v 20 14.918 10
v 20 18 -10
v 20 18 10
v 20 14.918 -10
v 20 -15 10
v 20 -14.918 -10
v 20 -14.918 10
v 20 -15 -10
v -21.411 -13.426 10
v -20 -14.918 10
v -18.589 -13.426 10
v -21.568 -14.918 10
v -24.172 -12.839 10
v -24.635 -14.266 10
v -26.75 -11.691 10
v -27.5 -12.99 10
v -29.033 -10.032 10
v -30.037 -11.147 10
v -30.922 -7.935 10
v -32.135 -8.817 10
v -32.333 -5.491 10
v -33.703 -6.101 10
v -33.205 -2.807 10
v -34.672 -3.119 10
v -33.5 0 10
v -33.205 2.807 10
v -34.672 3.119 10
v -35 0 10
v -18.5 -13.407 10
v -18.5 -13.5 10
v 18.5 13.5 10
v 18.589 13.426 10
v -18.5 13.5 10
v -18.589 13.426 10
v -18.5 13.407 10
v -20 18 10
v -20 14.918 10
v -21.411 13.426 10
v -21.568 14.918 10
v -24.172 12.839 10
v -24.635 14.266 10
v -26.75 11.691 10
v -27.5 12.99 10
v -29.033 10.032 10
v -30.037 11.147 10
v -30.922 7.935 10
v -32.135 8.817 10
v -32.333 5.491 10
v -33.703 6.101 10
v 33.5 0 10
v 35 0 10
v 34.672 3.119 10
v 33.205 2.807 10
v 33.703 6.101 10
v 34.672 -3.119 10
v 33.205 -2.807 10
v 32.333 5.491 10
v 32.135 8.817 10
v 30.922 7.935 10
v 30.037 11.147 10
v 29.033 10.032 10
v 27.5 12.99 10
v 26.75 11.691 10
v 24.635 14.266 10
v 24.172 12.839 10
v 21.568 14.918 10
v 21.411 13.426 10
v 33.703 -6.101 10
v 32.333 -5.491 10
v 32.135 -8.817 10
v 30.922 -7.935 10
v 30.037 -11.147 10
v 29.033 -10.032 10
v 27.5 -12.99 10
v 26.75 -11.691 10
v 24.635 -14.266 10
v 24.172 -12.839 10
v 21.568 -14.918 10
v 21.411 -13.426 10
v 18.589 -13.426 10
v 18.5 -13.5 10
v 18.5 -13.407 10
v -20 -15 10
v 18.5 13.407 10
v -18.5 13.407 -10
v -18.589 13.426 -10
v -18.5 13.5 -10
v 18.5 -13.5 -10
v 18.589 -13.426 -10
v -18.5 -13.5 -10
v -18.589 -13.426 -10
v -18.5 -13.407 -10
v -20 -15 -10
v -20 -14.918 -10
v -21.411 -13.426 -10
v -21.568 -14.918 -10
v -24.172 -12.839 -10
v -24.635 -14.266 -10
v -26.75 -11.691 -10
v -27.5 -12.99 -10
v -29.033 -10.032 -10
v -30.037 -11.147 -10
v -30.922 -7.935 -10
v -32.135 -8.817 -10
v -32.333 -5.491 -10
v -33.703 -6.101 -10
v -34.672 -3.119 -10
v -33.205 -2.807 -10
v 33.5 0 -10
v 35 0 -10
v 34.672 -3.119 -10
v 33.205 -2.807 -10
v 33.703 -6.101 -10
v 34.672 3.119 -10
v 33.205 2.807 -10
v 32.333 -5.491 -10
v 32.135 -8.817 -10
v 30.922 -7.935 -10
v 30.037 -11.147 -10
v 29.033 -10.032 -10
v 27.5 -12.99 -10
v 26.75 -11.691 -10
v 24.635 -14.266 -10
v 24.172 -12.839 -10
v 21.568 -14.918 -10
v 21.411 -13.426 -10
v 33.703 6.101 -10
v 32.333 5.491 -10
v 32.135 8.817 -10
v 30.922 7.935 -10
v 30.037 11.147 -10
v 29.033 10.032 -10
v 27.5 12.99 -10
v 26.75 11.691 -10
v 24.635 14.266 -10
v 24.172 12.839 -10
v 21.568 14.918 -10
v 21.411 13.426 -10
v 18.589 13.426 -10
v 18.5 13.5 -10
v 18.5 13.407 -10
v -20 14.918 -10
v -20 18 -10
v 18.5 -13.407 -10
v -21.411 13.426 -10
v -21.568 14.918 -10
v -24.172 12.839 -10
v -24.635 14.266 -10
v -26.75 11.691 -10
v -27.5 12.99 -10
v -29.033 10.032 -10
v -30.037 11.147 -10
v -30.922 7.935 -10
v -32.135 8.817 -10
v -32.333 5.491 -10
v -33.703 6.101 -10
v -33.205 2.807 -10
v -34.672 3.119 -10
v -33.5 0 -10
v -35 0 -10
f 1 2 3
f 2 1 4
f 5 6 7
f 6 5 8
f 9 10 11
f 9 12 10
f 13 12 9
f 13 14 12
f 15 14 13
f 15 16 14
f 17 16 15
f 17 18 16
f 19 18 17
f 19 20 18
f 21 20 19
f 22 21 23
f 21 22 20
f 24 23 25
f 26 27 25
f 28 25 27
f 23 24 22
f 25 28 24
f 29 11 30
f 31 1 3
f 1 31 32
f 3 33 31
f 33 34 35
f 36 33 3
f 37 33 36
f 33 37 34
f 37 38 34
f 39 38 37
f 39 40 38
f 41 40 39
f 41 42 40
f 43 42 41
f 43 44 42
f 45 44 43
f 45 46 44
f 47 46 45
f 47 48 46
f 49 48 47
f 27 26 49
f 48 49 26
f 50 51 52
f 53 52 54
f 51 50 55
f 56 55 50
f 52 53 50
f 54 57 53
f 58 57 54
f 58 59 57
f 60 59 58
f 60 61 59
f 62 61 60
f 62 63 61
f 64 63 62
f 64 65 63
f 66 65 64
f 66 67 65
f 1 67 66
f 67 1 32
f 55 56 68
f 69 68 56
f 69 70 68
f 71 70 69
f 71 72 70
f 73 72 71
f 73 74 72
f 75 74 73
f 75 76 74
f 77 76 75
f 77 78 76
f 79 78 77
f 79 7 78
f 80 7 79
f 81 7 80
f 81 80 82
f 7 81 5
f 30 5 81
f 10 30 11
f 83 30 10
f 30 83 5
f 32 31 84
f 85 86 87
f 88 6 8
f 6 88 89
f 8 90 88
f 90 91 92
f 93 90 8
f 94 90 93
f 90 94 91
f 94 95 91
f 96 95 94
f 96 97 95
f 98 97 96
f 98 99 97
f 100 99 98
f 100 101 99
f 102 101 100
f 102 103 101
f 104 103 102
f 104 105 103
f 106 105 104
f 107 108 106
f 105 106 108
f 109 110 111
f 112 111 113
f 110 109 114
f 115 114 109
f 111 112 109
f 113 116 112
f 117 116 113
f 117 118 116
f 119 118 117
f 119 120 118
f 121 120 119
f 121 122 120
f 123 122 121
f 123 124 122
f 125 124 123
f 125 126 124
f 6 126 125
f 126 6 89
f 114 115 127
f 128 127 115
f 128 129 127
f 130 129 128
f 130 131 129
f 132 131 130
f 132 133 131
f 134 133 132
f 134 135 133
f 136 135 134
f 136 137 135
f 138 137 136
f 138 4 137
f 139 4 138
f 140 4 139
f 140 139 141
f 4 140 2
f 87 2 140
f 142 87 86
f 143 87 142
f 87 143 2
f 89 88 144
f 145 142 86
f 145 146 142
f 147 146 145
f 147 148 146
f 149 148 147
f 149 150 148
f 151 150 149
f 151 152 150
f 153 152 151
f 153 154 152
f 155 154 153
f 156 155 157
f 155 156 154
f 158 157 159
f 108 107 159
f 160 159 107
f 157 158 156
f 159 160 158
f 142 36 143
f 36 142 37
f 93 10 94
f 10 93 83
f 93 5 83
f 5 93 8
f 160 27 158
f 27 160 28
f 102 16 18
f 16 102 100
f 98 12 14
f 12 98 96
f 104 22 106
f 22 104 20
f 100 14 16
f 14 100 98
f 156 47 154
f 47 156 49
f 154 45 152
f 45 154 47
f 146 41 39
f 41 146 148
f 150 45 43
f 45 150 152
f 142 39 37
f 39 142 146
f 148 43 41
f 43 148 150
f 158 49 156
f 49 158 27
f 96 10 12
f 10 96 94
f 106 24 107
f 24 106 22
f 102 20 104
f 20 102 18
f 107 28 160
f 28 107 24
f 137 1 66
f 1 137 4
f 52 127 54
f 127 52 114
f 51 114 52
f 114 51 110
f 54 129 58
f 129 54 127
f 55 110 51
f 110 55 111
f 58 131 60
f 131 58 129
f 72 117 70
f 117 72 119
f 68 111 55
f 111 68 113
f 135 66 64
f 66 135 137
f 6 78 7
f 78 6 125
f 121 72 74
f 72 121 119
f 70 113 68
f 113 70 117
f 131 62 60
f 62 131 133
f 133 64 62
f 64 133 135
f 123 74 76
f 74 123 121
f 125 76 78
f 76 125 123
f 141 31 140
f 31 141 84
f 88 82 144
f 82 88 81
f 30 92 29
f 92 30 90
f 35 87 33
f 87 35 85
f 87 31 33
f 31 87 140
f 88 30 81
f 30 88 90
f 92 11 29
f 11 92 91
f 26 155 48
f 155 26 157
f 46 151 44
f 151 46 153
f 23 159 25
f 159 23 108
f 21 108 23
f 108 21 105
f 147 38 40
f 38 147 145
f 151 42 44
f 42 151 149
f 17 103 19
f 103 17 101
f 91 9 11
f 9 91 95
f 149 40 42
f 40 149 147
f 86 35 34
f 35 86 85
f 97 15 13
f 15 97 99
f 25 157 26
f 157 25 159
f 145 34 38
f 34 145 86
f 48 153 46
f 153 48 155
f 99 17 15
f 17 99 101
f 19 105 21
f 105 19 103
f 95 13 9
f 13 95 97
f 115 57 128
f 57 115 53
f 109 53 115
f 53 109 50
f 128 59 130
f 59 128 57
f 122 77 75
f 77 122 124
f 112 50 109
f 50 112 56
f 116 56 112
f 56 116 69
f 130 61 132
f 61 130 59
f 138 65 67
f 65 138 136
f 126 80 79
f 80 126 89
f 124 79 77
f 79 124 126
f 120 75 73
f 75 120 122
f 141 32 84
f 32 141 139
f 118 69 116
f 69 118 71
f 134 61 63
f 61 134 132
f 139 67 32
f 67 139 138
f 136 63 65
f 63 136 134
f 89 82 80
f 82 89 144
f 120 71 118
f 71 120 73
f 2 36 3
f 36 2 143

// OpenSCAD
width = 20;
length = 40;
height = 30;
thick = 3;
elect_thick = 3;

color("blue")
{
difference()
{
    outer();
    inner();

}
translate([0,height/2+thick/2,0])
    cube([length,elect_thick,width],center=true);
}
module outer()
{
    cube([length,height,width],center=true);
    translate([-length/2,0,0])
        cylinder(r=height/2,h=width,center=true);
    translate([length/2,0,0])
        cylinder(r=height/2,h=width,center=true);
}
module inner()
{
    cube([length-thick,height-thick,width+thick],center=true);
    translate([-length/2,0,0])
        cylinder(r=(height-thick)/2,h=width+thick,center=true);
    translate([length/2,0,0])
        cylinder(r=(height-thick)/2,h=width+thick,center=true);
}
